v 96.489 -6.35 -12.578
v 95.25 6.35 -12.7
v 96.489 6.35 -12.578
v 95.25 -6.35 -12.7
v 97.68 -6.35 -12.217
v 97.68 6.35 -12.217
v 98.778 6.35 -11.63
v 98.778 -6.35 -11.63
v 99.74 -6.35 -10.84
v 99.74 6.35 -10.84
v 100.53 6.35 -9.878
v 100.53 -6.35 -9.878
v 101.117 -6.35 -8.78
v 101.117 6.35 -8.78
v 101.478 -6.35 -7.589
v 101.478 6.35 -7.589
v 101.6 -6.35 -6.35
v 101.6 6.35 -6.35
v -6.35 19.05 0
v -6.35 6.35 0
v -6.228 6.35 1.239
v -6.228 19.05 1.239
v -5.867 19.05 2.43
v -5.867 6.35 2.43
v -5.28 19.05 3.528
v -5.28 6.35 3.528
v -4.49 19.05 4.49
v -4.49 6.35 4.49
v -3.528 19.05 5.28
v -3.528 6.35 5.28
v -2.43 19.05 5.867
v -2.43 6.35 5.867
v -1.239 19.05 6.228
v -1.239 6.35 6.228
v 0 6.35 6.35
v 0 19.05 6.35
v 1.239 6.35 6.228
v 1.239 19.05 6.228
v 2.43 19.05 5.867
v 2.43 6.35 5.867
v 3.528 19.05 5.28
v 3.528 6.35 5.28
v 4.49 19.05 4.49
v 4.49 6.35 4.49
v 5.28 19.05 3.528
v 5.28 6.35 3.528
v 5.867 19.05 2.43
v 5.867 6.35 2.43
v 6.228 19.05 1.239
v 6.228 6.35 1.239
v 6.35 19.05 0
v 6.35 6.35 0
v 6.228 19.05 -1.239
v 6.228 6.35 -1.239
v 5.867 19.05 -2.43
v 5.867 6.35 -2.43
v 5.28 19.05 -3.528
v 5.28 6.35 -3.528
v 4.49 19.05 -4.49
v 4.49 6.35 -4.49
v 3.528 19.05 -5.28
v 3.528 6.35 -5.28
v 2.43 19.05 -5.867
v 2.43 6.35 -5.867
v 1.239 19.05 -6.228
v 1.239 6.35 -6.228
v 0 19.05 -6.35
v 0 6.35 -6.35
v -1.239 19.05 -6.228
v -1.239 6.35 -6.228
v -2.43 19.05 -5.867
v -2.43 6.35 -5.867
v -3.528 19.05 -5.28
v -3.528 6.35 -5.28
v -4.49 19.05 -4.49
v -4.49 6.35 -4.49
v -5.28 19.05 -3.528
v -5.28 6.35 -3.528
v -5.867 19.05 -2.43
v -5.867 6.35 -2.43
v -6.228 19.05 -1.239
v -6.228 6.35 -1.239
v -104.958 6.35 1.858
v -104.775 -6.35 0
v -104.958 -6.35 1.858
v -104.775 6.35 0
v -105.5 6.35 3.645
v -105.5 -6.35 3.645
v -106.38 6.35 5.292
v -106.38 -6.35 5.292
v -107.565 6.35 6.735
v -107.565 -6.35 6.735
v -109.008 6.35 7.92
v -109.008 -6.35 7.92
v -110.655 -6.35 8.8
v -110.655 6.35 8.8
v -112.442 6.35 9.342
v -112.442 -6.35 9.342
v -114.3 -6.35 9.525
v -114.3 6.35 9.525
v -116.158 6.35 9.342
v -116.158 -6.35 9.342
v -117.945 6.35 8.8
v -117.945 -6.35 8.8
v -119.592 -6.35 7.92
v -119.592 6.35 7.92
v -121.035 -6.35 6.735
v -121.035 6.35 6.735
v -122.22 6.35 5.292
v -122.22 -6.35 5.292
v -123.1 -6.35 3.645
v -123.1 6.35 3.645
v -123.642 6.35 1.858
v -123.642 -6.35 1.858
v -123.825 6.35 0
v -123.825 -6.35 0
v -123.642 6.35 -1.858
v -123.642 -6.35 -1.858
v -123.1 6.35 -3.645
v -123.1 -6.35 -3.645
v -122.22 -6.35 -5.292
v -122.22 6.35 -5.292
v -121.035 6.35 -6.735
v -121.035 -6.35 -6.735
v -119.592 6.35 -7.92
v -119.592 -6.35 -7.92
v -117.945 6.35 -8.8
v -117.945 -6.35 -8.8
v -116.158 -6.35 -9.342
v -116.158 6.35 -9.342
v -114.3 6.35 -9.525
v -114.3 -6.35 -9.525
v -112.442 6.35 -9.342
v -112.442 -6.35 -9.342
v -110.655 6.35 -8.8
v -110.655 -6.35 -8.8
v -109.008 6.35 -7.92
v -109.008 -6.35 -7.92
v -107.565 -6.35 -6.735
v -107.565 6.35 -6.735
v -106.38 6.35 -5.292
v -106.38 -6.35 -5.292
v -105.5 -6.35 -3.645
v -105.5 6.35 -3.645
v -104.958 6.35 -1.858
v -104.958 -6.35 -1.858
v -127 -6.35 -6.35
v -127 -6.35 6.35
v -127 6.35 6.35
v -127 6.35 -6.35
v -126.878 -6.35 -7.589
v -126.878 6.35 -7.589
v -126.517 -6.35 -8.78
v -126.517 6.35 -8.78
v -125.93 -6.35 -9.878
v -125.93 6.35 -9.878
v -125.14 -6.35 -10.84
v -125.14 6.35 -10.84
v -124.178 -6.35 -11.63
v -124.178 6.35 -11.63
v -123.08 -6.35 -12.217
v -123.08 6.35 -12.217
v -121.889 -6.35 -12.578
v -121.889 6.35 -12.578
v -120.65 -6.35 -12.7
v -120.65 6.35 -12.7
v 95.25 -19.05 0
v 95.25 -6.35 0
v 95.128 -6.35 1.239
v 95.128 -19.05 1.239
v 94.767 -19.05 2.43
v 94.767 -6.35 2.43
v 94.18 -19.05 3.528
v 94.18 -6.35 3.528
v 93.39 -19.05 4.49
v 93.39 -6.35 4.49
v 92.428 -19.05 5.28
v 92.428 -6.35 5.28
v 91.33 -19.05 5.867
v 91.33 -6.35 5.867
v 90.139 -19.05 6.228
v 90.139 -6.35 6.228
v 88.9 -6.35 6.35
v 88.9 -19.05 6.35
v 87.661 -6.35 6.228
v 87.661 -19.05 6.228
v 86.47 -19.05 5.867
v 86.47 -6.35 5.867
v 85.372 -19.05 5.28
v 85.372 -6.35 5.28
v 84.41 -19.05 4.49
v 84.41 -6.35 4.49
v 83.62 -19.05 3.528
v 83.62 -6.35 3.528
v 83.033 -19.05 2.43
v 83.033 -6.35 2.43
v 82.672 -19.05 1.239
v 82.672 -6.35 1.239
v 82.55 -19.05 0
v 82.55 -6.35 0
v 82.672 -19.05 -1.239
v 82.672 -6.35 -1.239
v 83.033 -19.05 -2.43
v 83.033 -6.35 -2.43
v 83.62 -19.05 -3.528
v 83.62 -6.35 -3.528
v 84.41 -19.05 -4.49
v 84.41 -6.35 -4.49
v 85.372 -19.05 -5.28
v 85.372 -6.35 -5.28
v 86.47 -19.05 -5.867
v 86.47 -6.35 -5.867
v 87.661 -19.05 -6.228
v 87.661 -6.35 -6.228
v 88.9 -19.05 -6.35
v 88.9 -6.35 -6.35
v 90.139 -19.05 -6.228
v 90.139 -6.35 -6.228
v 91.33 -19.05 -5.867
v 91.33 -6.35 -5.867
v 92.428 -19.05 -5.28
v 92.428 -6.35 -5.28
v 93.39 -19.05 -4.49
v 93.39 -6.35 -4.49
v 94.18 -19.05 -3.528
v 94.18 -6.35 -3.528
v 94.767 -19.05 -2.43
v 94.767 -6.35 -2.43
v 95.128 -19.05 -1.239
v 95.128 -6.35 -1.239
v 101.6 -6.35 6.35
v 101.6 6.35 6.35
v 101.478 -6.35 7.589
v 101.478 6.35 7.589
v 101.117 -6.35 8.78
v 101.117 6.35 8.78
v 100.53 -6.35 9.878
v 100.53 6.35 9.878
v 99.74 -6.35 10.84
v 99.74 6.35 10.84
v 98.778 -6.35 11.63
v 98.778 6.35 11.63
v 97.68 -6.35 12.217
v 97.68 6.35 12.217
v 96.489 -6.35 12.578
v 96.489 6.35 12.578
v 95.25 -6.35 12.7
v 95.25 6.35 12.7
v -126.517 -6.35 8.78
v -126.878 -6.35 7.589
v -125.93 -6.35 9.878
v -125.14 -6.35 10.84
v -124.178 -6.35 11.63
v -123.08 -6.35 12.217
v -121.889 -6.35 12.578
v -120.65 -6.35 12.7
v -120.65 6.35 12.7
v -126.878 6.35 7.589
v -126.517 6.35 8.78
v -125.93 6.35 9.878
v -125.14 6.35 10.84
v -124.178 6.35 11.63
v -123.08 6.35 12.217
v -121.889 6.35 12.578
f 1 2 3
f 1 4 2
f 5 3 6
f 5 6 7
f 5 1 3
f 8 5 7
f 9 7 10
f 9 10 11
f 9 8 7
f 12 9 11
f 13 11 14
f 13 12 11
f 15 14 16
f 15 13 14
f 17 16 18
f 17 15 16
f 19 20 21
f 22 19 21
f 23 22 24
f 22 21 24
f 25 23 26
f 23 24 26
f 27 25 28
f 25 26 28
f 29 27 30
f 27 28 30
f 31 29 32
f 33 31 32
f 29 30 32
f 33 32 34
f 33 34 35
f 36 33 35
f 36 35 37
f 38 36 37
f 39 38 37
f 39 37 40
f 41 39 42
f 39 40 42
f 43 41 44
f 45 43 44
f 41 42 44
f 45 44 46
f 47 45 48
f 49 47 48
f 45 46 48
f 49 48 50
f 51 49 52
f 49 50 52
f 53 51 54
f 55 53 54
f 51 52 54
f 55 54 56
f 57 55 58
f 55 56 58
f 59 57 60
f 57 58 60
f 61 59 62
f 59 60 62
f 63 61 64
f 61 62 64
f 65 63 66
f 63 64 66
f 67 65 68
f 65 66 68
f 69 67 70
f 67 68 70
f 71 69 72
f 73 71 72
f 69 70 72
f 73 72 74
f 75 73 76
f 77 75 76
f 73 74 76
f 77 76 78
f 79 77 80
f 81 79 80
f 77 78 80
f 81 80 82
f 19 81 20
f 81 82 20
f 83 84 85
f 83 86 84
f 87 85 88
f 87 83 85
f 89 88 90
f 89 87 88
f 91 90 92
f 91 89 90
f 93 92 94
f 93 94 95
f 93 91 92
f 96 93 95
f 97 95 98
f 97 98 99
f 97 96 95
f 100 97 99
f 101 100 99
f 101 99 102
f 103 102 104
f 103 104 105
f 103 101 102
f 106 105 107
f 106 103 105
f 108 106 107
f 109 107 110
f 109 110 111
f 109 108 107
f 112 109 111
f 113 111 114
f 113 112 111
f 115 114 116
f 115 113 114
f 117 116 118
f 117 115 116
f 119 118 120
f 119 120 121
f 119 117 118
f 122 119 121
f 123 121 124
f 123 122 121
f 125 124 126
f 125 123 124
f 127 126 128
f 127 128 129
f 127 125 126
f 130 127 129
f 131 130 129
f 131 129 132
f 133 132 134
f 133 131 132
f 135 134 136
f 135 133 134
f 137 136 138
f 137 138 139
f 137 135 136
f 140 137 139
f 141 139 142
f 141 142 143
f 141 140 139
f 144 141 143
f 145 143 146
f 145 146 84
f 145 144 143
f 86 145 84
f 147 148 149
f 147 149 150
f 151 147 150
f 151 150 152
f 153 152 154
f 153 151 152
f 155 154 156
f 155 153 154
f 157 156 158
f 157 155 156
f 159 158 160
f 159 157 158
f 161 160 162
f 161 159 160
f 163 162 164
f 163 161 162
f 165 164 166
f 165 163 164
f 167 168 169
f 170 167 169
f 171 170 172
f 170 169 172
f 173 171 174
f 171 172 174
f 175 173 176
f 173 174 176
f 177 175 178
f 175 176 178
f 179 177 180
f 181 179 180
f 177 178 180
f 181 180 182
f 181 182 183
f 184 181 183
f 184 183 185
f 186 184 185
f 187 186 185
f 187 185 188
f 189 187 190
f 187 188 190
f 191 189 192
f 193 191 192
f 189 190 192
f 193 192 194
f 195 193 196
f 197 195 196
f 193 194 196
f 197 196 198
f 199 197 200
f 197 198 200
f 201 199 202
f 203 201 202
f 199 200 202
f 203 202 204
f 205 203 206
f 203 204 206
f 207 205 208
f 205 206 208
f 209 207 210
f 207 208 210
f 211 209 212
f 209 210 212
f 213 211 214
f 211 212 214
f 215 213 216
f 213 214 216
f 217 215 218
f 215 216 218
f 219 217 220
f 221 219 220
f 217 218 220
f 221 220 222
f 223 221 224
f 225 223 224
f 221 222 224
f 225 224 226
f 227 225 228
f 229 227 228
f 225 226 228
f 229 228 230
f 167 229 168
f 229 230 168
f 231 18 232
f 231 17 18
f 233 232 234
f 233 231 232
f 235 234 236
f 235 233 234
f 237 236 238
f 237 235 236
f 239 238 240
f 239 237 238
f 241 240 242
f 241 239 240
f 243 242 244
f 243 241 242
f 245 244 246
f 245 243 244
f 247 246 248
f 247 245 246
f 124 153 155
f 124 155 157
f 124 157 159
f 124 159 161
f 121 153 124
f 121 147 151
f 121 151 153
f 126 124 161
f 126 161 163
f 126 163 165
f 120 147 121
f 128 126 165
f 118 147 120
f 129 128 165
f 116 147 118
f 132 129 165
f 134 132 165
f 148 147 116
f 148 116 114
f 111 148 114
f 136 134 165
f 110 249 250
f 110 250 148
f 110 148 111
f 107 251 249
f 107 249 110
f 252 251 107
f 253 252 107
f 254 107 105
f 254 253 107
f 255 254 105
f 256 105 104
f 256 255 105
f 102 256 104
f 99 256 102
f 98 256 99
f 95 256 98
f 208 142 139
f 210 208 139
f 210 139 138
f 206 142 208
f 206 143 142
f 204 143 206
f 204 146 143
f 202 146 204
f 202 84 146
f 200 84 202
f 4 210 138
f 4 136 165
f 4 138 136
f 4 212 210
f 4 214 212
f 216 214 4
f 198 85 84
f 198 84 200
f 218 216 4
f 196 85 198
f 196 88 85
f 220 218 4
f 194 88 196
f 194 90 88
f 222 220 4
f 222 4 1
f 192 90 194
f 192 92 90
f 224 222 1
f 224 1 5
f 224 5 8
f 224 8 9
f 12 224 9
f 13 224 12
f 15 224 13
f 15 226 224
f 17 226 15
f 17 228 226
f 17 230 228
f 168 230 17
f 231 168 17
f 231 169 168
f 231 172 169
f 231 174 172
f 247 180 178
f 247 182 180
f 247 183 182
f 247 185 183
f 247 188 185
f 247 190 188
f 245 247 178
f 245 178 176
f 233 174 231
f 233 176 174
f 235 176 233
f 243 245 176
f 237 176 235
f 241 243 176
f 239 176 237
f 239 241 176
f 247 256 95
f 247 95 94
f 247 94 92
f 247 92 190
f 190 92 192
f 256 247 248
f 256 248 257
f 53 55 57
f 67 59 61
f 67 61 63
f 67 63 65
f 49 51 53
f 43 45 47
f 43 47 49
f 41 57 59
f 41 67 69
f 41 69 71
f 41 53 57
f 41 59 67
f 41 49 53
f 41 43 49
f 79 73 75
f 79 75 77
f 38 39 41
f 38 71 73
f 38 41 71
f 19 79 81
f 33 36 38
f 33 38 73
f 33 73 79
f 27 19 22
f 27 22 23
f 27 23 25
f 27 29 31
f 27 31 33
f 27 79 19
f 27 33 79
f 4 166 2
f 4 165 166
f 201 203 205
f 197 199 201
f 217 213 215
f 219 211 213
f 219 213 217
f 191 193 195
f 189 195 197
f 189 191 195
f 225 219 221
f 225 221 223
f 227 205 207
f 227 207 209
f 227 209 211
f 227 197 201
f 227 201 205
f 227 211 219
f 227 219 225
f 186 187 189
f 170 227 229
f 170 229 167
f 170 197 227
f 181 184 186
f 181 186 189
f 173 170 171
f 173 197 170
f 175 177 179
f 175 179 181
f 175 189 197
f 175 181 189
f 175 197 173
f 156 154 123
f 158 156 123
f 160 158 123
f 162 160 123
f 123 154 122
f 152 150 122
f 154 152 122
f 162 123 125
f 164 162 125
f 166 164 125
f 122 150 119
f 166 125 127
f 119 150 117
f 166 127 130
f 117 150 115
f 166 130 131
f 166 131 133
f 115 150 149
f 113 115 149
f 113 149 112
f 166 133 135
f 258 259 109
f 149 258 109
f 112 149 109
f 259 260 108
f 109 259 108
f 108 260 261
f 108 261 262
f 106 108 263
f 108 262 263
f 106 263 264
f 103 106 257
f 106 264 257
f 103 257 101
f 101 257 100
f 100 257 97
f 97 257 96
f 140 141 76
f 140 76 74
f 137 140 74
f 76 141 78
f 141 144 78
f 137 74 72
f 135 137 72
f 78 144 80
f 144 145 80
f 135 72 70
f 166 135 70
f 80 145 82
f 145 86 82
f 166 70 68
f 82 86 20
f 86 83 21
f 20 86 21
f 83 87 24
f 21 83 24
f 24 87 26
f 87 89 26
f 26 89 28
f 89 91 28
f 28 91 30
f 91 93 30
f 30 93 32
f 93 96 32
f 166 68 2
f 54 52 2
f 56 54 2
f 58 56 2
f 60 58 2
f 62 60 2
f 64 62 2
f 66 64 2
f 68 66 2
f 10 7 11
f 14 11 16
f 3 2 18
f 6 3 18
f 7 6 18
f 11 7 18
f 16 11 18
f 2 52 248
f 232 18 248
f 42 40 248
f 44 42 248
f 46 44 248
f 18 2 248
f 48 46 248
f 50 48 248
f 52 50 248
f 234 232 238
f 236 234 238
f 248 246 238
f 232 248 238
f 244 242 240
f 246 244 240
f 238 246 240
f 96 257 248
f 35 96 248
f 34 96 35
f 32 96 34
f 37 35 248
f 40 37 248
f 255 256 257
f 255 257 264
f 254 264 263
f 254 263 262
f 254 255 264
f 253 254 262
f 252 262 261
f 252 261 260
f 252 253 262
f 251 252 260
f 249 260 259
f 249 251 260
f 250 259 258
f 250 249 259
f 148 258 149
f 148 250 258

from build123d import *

# Parameters (mm, degrees)
F0_R     = 9.525
F1_DEPTH = 6.35
F2_R     = 6.35
F3_DEPTH = 12.7
F4_R     = 6.35
F5_DEPTH = 12.7


with BuildPart() as f1:
    # F0 (on Front) → F1 (new body, symmetric)
    with BuildSketch(Plane.XZ):
        with BuildLine():
            ThreePointArc((101.6, 6.35), (99.740128, 10.840128), (95.25, 12.7))
            Line((95.25, 12.7), (-120.65, 12.7))
            ThreePointArc((-120.65, 12.7), (-125.140128, 10.840128), (-127, 6.35))
            Line((-127, 6.35), (-127, -6.35))
            ThreePointArc((-127, -6.35), (-125.140128, -10.840128), (-120.65, -12.7))
            Line((-120.65, -12.7), (95.25, -12.7))
            ThreePointArc((95.25, -12.7), (99.740128, -10.840128), (101.6, -6.35))
            Line((101.6, -6.35), (101.6, 6.35))
        make_face()
        with Locations((-114.3, 0)):
            Circle(F0_R, mode=Mode.SUBTRACT)
    extrude(amount=F1_DEPTH, both=True)

    # F2 (on face) → F3 (join)
    with BuildSketch(Plane.XZ.offset(6.35)):
        with Locations((88.9, 0)):
            Circle(F2_R)
    extrude(amount=F3_DEPTH)

    # F4 (on face) → F5 (join)
    with BuildSketch(Plane(origin=(0, 6.35, 0), x_dir=(-1, 0, 0), z_dir=(0, 1, 0))):
        Circle(F4_R)
    extrude(amount=F5_DEPTH)


solid = f1.part
